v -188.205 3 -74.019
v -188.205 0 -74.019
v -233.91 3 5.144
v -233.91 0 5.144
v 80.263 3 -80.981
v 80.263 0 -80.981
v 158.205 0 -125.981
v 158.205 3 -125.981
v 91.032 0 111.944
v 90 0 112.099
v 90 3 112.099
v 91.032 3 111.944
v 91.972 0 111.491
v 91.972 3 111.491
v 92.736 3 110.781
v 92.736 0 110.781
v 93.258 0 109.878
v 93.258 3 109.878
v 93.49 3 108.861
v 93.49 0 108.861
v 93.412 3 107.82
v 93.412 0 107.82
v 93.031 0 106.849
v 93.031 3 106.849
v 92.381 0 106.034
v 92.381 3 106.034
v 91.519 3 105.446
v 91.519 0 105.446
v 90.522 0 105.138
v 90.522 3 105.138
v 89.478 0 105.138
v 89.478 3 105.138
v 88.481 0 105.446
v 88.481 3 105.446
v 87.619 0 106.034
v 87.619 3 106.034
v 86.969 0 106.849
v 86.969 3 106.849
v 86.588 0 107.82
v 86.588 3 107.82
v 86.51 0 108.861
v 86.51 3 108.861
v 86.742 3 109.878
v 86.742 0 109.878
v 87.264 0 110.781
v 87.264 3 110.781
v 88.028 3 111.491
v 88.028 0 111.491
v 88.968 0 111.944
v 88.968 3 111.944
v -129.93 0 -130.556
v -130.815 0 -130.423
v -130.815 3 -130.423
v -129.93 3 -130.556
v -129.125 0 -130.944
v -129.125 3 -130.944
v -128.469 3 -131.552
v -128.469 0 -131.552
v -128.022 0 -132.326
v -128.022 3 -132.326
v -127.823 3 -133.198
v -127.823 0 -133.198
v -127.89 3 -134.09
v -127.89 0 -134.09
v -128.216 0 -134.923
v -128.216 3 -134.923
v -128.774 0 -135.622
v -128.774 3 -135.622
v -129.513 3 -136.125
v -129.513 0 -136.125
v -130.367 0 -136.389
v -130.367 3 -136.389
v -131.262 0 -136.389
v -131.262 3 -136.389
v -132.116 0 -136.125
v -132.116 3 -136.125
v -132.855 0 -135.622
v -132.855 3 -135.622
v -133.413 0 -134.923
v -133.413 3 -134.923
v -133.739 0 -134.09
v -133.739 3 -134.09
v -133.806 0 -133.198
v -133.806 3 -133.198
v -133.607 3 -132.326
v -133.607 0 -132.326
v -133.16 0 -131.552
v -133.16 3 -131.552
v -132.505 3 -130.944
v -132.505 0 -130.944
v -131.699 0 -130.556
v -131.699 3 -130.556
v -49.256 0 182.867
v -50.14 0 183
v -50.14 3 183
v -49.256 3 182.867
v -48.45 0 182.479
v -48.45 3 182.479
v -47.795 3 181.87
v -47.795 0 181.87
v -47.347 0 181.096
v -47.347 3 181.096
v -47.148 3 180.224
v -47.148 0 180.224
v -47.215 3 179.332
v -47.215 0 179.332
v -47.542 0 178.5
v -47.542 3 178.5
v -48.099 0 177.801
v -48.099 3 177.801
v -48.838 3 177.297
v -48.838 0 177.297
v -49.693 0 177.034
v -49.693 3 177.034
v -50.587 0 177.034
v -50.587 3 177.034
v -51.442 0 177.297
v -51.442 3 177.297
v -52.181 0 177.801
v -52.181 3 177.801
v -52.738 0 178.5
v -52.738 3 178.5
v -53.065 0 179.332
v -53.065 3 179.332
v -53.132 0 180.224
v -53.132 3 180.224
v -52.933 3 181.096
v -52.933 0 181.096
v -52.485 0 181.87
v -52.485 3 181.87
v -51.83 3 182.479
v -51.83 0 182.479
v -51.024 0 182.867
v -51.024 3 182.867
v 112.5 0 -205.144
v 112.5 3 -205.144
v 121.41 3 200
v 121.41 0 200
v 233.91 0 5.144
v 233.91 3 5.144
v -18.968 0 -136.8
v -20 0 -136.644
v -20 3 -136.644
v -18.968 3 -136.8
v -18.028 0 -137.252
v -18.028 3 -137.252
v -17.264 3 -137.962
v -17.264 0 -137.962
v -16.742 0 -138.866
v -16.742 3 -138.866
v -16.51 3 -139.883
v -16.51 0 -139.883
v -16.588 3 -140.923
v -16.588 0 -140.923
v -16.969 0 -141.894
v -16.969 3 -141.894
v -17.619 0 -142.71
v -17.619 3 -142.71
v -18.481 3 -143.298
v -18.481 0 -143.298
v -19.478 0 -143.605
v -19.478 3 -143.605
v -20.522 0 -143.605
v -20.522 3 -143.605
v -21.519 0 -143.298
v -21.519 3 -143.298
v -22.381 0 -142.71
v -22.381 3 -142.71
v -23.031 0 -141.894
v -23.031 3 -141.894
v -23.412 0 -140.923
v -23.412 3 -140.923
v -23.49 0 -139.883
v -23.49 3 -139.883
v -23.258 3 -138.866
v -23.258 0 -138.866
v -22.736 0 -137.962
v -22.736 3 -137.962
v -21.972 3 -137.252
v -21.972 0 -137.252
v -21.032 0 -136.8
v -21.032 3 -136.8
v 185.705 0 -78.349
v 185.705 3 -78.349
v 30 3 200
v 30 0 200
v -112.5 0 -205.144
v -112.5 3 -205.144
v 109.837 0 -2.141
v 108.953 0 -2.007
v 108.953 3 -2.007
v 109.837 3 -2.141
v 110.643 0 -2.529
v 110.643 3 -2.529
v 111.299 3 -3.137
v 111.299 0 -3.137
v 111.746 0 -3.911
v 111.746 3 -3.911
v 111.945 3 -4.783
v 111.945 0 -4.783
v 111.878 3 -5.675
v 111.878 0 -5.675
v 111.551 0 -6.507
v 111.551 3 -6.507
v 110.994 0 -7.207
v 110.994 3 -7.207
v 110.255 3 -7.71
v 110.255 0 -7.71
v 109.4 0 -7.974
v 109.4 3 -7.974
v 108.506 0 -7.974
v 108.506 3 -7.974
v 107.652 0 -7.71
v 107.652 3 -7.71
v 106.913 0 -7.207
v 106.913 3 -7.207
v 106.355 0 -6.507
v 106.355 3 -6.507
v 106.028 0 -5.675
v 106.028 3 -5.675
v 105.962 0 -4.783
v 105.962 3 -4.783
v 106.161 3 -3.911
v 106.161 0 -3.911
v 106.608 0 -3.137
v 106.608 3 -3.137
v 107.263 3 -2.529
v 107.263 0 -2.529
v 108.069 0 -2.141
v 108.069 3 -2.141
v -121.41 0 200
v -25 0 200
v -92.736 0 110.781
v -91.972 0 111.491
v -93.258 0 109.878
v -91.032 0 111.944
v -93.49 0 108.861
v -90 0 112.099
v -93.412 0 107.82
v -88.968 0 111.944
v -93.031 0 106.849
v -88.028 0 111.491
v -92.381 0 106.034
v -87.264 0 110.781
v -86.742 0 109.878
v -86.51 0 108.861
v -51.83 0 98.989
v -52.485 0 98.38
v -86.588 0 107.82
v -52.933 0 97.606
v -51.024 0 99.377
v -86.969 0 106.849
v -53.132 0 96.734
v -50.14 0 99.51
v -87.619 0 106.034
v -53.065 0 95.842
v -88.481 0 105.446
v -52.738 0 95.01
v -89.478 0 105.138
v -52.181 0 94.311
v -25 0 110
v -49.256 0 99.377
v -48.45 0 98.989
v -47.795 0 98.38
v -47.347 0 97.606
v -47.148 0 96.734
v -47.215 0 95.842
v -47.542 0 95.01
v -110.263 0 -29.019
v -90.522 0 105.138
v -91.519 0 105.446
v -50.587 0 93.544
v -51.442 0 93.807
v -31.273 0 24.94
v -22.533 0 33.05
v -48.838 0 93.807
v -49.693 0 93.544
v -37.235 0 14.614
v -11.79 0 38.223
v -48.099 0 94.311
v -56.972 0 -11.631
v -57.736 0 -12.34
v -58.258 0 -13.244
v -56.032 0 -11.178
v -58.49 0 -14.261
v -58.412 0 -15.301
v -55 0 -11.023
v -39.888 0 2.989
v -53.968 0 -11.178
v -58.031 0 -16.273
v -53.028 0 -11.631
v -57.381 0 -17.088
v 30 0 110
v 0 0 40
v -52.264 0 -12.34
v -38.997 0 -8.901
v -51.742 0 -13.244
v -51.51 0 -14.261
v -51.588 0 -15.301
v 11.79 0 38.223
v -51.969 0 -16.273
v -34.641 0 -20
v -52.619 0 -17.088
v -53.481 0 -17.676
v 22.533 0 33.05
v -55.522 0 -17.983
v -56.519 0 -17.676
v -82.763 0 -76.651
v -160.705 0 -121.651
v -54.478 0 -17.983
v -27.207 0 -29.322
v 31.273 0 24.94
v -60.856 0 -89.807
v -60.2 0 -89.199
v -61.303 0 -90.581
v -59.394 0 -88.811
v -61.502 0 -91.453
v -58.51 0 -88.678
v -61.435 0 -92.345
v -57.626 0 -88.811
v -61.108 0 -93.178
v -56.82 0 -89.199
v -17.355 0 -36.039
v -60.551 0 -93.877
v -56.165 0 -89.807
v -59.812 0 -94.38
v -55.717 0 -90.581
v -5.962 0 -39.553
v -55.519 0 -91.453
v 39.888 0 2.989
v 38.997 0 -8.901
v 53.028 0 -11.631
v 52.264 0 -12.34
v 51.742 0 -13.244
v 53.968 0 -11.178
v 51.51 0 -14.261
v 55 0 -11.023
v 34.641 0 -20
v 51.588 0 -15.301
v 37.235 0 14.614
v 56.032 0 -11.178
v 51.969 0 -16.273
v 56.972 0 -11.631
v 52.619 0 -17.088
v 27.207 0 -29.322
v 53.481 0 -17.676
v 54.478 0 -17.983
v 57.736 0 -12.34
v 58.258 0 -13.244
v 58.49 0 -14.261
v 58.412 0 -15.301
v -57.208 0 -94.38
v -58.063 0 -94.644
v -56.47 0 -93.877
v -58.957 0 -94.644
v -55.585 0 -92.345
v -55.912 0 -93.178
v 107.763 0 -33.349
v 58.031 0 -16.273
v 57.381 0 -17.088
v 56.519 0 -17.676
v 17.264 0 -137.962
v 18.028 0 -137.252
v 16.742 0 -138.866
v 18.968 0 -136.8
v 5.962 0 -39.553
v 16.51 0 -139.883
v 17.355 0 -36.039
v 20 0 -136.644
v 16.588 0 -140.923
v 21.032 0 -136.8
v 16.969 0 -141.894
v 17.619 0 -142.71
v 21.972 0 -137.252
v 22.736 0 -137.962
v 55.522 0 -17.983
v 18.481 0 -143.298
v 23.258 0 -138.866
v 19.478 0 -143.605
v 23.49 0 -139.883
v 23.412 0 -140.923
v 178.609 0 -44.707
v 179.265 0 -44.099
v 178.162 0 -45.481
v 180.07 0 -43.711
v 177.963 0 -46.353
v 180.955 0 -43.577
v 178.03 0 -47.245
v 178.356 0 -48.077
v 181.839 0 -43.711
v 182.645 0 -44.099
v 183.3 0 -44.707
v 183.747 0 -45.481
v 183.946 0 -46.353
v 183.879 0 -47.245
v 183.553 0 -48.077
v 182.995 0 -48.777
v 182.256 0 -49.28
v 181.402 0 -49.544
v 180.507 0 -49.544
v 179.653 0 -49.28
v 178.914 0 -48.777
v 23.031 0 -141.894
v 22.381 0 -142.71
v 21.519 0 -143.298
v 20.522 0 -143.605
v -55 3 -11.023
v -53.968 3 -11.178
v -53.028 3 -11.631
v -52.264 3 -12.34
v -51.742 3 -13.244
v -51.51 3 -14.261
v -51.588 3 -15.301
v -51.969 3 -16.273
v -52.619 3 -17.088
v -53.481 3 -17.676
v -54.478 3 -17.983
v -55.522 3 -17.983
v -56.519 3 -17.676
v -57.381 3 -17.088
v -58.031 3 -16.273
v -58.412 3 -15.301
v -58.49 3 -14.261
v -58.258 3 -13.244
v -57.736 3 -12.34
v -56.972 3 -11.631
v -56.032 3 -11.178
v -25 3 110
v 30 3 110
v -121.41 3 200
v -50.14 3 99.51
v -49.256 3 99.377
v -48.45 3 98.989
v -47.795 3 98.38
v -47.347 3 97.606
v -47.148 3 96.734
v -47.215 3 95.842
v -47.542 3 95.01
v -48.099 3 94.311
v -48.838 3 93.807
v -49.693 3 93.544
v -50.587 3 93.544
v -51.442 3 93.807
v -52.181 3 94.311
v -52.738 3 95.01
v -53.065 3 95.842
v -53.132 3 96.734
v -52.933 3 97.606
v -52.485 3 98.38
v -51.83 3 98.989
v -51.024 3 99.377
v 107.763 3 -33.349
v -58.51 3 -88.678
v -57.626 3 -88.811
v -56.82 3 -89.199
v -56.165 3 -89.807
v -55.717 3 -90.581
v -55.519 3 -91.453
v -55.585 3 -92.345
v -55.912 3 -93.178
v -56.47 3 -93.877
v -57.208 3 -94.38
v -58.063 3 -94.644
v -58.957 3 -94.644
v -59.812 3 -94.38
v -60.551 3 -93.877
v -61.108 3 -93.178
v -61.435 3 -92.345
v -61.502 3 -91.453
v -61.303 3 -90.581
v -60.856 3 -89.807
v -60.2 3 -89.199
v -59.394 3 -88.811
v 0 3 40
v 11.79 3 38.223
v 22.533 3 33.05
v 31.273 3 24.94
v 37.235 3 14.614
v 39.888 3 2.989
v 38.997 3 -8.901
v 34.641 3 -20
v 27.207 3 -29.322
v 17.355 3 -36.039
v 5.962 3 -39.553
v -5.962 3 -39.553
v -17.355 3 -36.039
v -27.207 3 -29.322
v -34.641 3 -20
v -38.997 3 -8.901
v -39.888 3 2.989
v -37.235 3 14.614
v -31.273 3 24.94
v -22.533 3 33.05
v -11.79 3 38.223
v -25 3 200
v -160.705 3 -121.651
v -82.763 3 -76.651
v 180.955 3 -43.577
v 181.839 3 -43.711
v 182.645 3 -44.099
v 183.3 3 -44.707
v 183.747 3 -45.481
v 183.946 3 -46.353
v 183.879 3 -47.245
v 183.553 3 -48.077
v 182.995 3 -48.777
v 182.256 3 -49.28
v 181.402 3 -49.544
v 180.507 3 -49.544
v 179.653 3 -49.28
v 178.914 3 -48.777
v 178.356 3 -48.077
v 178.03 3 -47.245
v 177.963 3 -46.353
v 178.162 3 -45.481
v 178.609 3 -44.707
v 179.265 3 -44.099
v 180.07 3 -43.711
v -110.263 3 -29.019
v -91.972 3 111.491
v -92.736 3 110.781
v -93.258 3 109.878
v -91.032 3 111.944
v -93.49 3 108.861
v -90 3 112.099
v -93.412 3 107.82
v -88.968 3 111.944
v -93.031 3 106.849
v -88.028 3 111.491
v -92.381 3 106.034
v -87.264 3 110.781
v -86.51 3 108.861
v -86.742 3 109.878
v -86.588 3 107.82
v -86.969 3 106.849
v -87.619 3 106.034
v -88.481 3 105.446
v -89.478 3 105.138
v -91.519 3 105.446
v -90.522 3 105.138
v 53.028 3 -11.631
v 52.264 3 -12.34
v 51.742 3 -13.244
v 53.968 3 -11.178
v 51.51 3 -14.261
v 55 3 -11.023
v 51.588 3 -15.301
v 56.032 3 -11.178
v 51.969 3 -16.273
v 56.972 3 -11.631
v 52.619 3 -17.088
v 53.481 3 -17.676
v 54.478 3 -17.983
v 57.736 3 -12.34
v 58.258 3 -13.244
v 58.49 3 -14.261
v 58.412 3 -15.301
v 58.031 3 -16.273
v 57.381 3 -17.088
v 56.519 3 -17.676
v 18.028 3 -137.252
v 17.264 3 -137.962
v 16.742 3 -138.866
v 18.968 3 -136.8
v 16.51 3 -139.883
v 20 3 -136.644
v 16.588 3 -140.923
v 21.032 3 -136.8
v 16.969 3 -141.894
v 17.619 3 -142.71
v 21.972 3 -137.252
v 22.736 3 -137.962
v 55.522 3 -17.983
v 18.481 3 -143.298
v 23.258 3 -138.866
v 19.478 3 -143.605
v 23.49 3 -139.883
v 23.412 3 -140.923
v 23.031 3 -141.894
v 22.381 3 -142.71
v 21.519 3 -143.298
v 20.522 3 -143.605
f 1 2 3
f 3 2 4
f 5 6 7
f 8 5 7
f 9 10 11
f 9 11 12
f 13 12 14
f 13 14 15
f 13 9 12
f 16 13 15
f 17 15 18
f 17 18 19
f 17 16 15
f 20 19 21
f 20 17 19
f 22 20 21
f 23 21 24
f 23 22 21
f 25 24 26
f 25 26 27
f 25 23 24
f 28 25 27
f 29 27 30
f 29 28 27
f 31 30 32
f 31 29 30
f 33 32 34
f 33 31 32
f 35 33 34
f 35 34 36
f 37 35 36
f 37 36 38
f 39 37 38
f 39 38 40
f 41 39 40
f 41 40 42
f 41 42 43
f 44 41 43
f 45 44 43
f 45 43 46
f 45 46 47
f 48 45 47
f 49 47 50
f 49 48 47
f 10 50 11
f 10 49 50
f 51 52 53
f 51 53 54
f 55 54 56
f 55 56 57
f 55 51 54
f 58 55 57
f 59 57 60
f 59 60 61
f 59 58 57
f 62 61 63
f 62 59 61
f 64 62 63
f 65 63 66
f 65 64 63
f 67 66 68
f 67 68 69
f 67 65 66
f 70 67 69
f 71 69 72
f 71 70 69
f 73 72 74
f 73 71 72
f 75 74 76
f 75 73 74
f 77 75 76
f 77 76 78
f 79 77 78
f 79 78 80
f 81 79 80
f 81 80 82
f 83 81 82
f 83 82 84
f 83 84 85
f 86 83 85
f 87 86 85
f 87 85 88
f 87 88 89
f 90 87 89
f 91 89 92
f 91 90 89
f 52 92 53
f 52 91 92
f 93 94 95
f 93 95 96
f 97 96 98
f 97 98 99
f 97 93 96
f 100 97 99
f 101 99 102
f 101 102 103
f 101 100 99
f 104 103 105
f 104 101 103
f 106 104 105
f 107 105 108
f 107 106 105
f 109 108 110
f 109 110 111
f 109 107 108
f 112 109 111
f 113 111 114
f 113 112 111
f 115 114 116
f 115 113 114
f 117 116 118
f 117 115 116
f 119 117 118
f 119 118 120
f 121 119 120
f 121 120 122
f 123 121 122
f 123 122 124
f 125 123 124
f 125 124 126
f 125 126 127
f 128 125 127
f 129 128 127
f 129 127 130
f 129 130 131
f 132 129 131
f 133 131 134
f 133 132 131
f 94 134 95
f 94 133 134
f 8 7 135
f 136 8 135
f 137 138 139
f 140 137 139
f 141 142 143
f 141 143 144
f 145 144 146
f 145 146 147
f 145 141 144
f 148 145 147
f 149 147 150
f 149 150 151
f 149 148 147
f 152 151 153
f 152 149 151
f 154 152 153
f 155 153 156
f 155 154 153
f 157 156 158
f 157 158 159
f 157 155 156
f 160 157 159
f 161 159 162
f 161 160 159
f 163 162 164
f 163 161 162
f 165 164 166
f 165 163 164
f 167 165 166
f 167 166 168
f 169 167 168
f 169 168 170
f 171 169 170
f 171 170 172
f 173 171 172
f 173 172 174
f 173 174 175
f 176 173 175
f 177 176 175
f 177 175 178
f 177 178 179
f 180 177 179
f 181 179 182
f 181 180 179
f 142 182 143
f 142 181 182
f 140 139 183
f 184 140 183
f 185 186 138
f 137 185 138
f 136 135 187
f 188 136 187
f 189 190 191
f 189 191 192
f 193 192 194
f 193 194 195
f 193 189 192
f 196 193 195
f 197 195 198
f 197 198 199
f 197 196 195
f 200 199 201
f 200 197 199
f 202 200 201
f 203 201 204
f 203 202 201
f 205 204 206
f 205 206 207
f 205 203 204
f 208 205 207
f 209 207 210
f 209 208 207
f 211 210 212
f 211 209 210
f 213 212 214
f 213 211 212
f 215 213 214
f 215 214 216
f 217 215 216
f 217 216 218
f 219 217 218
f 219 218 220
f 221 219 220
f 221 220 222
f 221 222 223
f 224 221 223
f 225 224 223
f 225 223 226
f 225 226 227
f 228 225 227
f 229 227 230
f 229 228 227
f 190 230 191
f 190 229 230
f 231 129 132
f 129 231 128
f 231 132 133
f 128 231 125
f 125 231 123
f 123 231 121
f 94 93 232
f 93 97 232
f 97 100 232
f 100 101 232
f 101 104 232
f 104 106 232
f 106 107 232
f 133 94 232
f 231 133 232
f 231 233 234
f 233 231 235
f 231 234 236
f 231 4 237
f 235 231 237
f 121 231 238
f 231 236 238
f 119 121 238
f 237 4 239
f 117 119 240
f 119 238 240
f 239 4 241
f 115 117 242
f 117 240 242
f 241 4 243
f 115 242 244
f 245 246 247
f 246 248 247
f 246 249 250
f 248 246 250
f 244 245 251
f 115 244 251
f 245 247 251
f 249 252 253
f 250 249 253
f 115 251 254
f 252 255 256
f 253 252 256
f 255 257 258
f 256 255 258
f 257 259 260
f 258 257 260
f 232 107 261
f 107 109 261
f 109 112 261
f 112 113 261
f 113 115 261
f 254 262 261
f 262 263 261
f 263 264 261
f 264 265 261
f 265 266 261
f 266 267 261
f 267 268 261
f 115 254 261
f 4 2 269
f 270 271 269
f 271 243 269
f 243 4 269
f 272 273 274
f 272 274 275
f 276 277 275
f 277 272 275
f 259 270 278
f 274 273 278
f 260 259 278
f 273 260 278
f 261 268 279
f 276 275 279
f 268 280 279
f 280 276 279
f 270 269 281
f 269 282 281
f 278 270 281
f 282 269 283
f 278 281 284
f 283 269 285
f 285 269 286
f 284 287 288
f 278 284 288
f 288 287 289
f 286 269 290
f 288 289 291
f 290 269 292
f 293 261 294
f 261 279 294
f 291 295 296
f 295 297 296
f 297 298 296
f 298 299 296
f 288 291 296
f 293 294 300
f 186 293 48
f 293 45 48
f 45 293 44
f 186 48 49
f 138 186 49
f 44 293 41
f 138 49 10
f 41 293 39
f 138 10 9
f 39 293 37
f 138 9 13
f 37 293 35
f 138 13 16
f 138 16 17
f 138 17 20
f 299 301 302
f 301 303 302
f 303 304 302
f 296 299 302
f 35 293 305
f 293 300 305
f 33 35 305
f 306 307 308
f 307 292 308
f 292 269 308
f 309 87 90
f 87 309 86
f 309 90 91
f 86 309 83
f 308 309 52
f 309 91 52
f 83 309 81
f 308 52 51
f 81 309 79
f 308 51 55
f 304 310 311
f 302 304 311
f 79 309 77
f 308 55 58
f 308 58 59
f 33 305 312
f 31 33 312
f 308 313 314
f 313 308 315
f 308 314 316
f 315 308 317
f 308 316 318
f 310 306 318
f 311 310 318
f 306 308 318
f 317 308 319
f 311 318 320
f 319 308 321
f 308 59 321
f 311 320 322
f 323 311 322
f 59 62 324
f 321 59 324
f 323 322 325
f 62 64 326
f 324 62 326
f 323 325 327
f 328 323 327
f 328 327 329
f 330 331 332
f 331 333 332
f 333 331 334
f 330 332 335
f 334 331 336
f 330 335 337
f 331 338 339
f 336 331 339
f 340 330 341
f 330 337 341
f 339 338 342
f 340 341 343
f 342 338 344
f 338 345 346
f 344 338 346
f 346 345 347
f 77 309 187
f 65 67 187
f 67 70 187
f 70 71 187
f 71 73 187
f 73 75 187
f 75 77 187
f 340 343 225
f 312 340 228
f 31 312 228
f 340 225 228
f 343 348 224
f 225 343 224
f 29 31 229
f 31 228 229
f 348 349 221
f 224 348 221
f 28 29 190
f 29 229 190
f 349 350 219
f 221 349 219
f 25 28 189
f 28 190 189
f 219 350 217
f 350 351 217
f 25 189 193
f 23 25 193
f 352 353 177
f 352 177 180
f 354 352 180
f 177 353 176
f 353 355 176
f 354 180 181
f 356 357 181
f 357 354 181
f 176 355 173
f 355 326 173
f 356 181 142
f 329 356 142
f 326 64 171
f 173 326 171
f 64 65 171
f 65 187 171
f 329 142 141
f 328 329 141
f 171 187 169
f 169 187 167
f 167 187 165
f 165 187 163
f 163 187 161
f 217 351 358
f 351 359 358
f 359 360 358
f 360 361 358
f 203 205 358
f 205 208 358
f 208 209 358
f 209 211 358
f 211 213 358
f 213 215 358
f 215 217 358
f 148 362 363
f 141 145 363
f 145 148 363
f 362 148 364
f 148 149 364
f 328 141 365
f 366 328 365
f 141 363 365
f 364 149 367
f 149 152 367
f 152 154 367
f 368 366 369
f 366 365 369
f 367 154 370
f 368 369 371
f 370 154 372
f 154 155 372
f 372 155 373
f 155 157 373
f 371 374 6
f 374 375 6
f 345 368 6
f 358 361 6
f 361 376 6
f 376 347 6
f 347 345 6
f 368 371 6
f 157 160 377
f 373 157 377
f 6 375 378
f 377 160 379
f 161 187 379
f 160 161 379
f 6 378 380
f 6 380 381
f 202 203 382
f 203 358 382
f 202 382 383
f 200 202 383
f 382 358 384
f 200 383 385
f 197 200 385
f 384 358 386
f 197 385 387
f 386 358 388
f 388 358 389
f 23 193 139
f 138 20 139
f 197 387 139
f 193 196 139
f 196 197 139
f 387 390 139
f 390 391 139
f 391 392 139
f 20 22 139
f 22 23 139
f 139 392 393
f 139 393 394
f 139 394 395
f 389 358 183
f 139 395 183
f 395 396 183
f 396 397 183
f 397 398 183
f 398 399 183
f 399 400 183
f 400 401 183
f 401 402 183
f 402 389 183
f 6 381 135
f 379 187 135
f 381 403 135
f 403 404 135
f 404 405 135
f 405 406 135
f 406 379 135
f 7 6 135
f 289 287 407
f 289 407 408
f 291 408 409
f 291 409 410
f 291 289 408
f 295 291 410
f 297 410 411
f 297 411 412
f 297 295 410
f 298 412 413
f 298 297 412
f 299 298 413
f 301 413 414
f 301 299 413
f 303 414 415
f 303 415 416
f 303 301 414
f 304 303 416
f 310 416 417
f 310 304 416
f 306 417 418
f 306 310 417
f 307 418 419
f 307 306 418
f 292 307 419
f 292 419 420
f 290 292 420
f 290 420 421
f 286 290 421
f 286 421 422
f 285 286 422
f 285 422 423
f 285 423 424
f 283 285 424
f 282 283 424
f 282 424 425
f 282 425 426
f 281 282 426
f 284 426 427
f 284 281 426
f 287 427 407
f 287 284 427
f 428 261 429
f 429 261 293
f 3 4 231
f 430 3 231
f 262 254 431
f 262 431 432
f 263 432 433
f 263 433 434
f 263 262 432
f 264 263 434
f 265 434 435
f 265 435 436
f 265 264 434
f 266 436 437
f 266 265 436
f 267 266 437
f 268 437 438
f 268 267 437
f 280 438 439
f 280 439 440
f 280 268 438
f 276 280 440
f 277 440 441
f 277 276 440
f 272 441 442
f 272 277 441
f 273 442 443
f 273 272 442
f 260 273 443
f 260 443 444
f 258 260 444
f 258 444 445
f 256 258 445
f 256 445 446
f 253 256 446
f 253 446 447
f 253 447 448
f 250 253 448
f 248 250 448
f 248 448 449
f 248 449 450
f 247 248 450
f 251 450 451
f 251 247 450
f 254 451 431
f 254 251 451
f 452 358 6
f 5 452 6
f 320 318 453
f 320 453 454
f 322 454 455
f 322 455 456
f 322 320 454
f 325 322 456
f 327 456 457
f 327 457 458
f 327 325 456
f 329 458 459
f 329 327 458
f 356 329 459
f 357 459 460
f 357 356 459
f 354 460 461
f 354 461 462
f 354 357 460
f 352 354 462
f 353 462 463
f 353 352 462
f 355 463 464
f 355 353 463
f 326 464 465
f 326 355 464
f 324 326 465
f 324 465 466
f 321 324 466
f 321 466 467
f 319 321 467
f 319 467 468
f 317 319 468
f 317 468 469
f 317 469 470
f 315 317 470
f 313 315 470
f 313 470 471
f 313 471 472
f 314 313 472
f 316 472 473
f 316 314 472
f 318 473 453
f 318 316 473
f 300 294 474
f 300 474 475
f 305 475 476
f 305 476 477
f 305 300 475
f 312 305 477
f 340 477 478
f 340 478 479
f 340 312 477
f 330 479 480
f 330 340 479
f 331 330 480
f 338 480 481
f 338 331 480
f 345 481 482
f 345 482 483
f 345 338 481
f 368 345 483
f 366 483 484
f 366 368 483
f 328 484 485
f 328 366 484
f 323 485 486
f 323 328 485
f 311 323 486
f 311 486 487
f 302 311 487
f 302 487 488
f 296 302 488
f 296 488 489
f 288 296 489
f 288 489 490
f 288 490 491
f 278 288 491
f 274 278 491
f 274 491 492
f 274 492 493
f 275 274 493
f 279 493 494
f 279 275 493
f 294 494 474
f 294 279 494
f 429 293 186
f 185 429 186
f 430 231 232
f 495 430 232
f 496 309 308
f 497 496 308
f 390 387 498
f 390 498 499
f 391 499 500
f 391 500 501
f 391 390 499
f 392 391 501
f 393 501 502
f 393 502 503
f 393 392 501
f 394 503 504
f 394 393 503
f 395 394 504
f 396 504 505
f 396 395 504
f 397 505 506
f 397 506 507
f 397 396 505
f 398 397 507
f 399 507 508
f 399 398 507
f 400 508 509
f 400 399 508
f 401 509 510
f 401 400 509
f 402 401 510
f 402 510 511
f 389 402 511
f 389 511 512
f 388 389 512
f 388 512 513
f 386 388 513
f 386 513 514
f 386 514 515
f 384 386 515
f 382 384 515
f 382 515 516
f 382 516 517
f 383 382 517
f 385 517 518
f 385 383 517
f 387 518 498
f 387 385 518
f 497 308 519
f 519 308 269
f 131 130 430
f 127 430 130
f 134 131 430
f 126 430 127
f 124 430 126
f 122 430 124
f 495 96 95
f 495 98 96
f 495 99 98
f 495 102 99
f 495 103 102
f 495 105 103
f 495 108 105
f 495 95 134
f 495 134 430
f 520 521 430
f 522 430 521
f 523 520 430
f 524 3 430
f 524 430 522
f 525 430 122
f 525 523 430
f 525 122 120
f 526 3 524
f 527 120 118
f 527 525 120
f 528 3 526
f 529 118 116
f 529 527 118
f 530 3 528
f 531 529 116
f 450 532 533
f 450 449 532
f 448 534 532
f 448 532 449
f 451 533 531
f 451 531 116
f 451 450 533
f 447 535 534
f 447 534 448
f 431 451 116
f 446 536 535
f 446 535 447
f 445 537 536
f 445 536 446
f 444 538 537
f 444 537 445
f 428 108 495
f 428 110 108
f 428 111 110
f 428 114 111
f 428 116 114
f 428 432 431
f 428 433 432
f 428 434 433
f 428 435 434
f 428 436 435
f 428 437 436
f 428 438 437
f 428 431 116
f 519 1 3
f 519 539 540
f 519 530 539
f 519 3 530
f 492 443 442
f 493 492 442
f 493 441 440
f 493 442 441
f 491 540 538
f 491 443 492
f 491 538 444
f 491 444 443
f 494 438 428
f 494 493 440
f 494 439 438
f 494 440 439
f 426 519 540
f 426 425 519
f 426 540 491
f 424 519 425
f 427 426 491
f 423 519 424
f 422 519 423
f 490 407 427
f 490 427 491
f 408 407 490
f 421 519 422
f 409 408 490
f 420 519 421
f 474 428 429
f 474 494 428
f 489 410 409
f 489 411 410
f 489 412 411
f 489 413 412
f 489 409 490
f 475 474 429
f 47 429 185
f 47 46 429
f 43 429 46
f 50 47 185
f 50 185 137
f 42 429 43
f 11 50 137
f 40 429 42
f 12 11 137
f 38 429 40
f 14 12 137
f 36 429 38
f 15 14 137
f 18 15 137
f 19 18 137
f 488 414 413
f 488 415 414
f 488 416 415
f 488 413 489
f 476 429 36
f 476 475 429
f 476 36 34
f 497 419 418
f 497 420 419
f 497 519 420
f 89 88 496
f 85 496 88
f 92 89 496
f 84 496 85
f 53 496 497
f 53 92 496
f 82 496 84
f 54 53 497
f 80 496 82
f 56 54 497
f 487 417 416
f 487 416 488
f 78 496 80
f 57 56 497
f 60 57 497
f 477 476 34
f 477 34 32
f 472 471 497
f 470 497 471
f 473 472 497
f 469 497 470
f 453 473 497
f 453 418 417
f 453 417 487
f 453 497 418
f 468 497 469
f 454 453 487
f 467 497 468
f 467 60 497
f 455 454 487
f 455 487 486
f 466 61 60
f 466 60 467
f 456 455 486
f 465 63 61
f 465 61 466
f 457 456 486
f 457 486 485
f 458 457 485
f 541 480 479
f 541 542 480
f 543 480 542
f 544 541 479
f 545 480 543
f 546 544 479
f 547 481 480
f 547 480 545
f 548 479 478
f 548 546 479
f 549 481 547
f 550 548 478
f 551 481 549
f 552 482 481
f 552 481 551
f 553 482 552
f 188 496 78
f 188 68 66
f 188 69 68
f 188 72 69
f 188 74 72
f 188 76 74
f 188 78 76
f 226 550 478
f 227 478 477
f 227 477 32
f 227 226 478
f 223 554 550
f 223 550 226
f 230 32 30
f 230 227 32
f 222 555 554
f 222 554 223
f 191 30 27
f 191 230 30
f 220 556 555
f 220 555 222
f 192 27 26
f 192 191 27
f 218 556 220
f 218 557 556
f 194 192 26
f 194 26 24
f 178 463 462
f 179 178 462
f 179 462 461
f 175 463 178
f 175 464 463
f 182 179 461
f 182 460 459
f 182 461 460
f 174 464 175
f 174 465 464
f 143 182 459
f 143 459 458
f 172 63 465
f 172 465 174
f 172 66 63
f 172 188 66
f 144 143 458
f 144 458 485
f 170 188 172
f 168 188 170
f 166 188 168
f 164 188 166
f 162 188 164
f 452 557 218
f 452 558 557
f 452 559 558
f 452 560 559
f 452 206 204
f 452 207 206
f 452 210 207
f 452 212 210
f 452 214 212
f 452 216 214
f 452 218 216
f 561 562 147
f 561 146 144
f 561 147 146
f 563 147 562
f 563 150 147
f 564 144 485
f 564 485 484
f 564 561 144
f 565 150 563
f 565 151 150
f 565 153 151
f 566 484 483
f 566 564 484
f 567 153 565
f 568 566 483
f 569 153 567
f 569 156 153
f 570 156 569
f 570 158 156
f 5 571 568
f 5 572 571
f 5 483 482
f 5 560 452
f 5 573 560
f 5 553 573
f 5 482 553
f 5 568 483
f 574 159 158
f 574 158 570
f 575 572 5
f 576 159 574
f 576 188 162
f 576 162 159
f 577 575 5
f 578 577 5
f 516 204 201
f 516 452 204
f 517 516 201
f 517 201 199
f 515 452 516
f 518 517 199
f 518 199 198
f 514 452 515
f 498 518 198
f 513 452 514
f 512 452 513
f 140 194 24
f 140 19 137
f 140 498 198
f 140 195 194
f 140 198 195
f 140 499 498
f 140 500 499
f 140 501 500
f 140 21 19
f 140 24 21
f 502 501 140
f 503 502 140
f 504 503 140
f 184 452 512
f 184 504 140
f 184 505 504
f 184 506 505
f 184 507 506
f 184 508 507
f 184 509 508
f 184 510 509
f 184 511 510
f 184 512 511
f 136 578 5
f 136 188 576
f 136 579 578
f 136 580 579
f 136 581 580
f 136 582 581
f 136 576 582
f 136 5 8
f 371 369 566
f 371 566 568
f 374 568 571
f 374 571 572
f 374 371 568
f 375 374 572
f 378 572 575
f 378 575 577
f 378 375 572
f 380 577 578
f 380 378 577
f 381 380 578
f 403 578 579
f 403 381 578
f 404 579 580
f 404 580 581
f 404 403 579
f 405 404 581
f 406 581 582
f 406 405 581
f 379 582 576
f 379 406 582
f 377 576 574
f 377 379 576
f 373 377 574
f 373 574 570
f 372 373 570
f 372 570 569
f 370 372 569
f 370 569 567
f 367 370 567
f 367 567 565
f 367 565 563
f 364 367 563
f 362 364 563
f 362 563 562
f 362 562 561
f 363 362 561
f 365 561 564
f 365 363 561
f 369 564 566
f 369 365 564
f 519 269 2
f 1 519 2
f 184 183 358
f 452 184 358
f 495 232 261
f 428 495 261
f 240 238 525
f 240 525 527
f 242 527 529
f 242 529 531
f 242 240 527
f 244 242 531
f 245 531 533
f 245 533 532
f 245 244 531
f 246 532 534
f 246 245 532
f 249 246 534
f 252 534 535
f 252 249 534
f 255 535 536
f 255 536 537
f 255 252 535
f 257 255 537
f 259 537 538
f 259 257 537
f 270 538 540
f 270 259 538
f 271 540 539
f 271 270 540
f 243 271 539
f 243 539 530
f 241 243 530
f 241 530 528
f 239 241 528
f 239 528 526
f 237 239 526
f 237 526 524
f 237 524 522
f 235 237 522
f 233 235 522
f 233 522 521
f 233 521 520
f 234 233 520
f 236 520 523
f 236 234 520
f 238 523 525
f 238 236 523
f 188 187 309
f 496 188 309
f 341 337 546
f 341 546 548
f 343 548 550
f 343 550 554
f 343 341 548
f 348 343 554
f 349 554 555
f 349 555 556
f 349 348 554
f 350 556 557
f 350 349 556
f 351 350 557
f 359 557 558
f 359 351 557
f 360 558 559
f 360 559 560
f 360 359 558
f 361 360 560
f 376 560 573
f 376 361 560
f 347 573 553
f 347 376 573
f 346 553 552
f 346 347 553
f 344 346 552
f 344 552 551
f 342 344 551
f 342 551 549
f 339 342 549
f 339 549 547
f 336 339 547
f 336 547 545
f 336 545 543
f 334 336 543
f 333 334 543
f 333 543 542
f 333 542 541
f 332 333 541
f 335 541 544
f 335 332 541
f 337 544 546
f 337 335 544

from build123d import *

# Parameters (mm, degrees)
SKETCH1_R           = 3
SKETCH1_R_2         = 3.5
SKETCH1_R_3         = 40
BOSS_EXTRUDE1_DEPTH = 3


with BuildPart() as part:
    # Sketch1 → Boss-Extrude1 (new body)
    with BuildSketch(Plane(origin=(0, 0, 0), x_dir=(1, 0, 0), z_dir=(0, 1, 0))):
        Polygon((158.205080757, 125.980762114), (112.5, 205.144284149), (-112.5, 205.144284149), (-160.705080757, 121.650635095), (-82.762794416, 76.650635095), (-95.262794416, 55), (-110.262794416, 29.019237886), (-188.205080757, 74.019237886), (-233.910161514, -5.144284149), (-121.410161514, -200), (-25, -200), (-25, -110), (0, -110), (30, -110), (30, -200), (121.410161514, -200), (233.910161514, -5.144284149), (185.705080757, 78.349364905), (107.762794416, 33.349364905), (80.262794416, 80.980762114), align=None)
        with Locations(Location((-50.14, -180, 0), (0, 0, 270))):
            Circle(SKETCH1_R, mode=Mode.SUBTRACT)
        with Locations(Location((-90, -108.599272381, 0), (0, 0, 270))):
            Circle(SKETCH1_R_2, mode=Mode.SUBTRACT)
        with Locations(Location((-50.14, -96.51, 0), (0, 0, 270))):
            Circle(SKETCH1_R, mode=Mode.SUBTRACT)
        with Locations(Location((90, -108.599272381, 0), (0, 0, 270))):
            Circle(SKETCH1_R_2, mode=Mode.SUBTRACT)
        with Locations(Location((0, 0, 0), (0, 0, 270))):
            Circle(SKETCH1_R_3, mode=Mode.SUBTRACT)
        with Locations(Location((-55, 14.522505884, 0), (0, 0, 270))):
            Circle(SKETCH1_R_2, mode=Mode.SUBTRACT)
        with Locations(Location((-58.510111719, 91.677513746, 0), (0, 0, 270))):
            Circle(SKETCH1_R, mode=Mode.SUBTRACT)
        with Locations(Location((-130.814572681, 133.422513746, 0), (0, 0, 270))):
            Circle(SKETCH1_R, mode=Mode.SUBTRACT)
        with Locations(Location((-20, 140.144284149, 0), (0, 0, 270))):
            Circle(SKETCH1_R_2, mode=Mode.SUBTRACT)
        with Locations(Location((55, 14.522505884, 0), (0, 0, 270))):
            Circle(SKETCH1_R_2, mode=Mode.SUBTRACT)
        with Locations(Location((108.953220611, 5.007486254, 0), (0, 0, 270))):
            Circle(SKETCH1_R, mode=Mode.SUBTRACT)
        with Locations(Location((180.954572681, 46.577486254, 0), (0, 0, 270))):
            Circle(SKETCH1_R, mode=Mode.SUBTRACT)
        with Locations(Location((20, 140.144284149, 0), (0, 0, 270))):
            Circle(SKETCH1_R_2, mode=Mode.SUBTRACT)
    extrude(amount=BOSS_EXTRUDE1_DEPTH)


solid = part.part
